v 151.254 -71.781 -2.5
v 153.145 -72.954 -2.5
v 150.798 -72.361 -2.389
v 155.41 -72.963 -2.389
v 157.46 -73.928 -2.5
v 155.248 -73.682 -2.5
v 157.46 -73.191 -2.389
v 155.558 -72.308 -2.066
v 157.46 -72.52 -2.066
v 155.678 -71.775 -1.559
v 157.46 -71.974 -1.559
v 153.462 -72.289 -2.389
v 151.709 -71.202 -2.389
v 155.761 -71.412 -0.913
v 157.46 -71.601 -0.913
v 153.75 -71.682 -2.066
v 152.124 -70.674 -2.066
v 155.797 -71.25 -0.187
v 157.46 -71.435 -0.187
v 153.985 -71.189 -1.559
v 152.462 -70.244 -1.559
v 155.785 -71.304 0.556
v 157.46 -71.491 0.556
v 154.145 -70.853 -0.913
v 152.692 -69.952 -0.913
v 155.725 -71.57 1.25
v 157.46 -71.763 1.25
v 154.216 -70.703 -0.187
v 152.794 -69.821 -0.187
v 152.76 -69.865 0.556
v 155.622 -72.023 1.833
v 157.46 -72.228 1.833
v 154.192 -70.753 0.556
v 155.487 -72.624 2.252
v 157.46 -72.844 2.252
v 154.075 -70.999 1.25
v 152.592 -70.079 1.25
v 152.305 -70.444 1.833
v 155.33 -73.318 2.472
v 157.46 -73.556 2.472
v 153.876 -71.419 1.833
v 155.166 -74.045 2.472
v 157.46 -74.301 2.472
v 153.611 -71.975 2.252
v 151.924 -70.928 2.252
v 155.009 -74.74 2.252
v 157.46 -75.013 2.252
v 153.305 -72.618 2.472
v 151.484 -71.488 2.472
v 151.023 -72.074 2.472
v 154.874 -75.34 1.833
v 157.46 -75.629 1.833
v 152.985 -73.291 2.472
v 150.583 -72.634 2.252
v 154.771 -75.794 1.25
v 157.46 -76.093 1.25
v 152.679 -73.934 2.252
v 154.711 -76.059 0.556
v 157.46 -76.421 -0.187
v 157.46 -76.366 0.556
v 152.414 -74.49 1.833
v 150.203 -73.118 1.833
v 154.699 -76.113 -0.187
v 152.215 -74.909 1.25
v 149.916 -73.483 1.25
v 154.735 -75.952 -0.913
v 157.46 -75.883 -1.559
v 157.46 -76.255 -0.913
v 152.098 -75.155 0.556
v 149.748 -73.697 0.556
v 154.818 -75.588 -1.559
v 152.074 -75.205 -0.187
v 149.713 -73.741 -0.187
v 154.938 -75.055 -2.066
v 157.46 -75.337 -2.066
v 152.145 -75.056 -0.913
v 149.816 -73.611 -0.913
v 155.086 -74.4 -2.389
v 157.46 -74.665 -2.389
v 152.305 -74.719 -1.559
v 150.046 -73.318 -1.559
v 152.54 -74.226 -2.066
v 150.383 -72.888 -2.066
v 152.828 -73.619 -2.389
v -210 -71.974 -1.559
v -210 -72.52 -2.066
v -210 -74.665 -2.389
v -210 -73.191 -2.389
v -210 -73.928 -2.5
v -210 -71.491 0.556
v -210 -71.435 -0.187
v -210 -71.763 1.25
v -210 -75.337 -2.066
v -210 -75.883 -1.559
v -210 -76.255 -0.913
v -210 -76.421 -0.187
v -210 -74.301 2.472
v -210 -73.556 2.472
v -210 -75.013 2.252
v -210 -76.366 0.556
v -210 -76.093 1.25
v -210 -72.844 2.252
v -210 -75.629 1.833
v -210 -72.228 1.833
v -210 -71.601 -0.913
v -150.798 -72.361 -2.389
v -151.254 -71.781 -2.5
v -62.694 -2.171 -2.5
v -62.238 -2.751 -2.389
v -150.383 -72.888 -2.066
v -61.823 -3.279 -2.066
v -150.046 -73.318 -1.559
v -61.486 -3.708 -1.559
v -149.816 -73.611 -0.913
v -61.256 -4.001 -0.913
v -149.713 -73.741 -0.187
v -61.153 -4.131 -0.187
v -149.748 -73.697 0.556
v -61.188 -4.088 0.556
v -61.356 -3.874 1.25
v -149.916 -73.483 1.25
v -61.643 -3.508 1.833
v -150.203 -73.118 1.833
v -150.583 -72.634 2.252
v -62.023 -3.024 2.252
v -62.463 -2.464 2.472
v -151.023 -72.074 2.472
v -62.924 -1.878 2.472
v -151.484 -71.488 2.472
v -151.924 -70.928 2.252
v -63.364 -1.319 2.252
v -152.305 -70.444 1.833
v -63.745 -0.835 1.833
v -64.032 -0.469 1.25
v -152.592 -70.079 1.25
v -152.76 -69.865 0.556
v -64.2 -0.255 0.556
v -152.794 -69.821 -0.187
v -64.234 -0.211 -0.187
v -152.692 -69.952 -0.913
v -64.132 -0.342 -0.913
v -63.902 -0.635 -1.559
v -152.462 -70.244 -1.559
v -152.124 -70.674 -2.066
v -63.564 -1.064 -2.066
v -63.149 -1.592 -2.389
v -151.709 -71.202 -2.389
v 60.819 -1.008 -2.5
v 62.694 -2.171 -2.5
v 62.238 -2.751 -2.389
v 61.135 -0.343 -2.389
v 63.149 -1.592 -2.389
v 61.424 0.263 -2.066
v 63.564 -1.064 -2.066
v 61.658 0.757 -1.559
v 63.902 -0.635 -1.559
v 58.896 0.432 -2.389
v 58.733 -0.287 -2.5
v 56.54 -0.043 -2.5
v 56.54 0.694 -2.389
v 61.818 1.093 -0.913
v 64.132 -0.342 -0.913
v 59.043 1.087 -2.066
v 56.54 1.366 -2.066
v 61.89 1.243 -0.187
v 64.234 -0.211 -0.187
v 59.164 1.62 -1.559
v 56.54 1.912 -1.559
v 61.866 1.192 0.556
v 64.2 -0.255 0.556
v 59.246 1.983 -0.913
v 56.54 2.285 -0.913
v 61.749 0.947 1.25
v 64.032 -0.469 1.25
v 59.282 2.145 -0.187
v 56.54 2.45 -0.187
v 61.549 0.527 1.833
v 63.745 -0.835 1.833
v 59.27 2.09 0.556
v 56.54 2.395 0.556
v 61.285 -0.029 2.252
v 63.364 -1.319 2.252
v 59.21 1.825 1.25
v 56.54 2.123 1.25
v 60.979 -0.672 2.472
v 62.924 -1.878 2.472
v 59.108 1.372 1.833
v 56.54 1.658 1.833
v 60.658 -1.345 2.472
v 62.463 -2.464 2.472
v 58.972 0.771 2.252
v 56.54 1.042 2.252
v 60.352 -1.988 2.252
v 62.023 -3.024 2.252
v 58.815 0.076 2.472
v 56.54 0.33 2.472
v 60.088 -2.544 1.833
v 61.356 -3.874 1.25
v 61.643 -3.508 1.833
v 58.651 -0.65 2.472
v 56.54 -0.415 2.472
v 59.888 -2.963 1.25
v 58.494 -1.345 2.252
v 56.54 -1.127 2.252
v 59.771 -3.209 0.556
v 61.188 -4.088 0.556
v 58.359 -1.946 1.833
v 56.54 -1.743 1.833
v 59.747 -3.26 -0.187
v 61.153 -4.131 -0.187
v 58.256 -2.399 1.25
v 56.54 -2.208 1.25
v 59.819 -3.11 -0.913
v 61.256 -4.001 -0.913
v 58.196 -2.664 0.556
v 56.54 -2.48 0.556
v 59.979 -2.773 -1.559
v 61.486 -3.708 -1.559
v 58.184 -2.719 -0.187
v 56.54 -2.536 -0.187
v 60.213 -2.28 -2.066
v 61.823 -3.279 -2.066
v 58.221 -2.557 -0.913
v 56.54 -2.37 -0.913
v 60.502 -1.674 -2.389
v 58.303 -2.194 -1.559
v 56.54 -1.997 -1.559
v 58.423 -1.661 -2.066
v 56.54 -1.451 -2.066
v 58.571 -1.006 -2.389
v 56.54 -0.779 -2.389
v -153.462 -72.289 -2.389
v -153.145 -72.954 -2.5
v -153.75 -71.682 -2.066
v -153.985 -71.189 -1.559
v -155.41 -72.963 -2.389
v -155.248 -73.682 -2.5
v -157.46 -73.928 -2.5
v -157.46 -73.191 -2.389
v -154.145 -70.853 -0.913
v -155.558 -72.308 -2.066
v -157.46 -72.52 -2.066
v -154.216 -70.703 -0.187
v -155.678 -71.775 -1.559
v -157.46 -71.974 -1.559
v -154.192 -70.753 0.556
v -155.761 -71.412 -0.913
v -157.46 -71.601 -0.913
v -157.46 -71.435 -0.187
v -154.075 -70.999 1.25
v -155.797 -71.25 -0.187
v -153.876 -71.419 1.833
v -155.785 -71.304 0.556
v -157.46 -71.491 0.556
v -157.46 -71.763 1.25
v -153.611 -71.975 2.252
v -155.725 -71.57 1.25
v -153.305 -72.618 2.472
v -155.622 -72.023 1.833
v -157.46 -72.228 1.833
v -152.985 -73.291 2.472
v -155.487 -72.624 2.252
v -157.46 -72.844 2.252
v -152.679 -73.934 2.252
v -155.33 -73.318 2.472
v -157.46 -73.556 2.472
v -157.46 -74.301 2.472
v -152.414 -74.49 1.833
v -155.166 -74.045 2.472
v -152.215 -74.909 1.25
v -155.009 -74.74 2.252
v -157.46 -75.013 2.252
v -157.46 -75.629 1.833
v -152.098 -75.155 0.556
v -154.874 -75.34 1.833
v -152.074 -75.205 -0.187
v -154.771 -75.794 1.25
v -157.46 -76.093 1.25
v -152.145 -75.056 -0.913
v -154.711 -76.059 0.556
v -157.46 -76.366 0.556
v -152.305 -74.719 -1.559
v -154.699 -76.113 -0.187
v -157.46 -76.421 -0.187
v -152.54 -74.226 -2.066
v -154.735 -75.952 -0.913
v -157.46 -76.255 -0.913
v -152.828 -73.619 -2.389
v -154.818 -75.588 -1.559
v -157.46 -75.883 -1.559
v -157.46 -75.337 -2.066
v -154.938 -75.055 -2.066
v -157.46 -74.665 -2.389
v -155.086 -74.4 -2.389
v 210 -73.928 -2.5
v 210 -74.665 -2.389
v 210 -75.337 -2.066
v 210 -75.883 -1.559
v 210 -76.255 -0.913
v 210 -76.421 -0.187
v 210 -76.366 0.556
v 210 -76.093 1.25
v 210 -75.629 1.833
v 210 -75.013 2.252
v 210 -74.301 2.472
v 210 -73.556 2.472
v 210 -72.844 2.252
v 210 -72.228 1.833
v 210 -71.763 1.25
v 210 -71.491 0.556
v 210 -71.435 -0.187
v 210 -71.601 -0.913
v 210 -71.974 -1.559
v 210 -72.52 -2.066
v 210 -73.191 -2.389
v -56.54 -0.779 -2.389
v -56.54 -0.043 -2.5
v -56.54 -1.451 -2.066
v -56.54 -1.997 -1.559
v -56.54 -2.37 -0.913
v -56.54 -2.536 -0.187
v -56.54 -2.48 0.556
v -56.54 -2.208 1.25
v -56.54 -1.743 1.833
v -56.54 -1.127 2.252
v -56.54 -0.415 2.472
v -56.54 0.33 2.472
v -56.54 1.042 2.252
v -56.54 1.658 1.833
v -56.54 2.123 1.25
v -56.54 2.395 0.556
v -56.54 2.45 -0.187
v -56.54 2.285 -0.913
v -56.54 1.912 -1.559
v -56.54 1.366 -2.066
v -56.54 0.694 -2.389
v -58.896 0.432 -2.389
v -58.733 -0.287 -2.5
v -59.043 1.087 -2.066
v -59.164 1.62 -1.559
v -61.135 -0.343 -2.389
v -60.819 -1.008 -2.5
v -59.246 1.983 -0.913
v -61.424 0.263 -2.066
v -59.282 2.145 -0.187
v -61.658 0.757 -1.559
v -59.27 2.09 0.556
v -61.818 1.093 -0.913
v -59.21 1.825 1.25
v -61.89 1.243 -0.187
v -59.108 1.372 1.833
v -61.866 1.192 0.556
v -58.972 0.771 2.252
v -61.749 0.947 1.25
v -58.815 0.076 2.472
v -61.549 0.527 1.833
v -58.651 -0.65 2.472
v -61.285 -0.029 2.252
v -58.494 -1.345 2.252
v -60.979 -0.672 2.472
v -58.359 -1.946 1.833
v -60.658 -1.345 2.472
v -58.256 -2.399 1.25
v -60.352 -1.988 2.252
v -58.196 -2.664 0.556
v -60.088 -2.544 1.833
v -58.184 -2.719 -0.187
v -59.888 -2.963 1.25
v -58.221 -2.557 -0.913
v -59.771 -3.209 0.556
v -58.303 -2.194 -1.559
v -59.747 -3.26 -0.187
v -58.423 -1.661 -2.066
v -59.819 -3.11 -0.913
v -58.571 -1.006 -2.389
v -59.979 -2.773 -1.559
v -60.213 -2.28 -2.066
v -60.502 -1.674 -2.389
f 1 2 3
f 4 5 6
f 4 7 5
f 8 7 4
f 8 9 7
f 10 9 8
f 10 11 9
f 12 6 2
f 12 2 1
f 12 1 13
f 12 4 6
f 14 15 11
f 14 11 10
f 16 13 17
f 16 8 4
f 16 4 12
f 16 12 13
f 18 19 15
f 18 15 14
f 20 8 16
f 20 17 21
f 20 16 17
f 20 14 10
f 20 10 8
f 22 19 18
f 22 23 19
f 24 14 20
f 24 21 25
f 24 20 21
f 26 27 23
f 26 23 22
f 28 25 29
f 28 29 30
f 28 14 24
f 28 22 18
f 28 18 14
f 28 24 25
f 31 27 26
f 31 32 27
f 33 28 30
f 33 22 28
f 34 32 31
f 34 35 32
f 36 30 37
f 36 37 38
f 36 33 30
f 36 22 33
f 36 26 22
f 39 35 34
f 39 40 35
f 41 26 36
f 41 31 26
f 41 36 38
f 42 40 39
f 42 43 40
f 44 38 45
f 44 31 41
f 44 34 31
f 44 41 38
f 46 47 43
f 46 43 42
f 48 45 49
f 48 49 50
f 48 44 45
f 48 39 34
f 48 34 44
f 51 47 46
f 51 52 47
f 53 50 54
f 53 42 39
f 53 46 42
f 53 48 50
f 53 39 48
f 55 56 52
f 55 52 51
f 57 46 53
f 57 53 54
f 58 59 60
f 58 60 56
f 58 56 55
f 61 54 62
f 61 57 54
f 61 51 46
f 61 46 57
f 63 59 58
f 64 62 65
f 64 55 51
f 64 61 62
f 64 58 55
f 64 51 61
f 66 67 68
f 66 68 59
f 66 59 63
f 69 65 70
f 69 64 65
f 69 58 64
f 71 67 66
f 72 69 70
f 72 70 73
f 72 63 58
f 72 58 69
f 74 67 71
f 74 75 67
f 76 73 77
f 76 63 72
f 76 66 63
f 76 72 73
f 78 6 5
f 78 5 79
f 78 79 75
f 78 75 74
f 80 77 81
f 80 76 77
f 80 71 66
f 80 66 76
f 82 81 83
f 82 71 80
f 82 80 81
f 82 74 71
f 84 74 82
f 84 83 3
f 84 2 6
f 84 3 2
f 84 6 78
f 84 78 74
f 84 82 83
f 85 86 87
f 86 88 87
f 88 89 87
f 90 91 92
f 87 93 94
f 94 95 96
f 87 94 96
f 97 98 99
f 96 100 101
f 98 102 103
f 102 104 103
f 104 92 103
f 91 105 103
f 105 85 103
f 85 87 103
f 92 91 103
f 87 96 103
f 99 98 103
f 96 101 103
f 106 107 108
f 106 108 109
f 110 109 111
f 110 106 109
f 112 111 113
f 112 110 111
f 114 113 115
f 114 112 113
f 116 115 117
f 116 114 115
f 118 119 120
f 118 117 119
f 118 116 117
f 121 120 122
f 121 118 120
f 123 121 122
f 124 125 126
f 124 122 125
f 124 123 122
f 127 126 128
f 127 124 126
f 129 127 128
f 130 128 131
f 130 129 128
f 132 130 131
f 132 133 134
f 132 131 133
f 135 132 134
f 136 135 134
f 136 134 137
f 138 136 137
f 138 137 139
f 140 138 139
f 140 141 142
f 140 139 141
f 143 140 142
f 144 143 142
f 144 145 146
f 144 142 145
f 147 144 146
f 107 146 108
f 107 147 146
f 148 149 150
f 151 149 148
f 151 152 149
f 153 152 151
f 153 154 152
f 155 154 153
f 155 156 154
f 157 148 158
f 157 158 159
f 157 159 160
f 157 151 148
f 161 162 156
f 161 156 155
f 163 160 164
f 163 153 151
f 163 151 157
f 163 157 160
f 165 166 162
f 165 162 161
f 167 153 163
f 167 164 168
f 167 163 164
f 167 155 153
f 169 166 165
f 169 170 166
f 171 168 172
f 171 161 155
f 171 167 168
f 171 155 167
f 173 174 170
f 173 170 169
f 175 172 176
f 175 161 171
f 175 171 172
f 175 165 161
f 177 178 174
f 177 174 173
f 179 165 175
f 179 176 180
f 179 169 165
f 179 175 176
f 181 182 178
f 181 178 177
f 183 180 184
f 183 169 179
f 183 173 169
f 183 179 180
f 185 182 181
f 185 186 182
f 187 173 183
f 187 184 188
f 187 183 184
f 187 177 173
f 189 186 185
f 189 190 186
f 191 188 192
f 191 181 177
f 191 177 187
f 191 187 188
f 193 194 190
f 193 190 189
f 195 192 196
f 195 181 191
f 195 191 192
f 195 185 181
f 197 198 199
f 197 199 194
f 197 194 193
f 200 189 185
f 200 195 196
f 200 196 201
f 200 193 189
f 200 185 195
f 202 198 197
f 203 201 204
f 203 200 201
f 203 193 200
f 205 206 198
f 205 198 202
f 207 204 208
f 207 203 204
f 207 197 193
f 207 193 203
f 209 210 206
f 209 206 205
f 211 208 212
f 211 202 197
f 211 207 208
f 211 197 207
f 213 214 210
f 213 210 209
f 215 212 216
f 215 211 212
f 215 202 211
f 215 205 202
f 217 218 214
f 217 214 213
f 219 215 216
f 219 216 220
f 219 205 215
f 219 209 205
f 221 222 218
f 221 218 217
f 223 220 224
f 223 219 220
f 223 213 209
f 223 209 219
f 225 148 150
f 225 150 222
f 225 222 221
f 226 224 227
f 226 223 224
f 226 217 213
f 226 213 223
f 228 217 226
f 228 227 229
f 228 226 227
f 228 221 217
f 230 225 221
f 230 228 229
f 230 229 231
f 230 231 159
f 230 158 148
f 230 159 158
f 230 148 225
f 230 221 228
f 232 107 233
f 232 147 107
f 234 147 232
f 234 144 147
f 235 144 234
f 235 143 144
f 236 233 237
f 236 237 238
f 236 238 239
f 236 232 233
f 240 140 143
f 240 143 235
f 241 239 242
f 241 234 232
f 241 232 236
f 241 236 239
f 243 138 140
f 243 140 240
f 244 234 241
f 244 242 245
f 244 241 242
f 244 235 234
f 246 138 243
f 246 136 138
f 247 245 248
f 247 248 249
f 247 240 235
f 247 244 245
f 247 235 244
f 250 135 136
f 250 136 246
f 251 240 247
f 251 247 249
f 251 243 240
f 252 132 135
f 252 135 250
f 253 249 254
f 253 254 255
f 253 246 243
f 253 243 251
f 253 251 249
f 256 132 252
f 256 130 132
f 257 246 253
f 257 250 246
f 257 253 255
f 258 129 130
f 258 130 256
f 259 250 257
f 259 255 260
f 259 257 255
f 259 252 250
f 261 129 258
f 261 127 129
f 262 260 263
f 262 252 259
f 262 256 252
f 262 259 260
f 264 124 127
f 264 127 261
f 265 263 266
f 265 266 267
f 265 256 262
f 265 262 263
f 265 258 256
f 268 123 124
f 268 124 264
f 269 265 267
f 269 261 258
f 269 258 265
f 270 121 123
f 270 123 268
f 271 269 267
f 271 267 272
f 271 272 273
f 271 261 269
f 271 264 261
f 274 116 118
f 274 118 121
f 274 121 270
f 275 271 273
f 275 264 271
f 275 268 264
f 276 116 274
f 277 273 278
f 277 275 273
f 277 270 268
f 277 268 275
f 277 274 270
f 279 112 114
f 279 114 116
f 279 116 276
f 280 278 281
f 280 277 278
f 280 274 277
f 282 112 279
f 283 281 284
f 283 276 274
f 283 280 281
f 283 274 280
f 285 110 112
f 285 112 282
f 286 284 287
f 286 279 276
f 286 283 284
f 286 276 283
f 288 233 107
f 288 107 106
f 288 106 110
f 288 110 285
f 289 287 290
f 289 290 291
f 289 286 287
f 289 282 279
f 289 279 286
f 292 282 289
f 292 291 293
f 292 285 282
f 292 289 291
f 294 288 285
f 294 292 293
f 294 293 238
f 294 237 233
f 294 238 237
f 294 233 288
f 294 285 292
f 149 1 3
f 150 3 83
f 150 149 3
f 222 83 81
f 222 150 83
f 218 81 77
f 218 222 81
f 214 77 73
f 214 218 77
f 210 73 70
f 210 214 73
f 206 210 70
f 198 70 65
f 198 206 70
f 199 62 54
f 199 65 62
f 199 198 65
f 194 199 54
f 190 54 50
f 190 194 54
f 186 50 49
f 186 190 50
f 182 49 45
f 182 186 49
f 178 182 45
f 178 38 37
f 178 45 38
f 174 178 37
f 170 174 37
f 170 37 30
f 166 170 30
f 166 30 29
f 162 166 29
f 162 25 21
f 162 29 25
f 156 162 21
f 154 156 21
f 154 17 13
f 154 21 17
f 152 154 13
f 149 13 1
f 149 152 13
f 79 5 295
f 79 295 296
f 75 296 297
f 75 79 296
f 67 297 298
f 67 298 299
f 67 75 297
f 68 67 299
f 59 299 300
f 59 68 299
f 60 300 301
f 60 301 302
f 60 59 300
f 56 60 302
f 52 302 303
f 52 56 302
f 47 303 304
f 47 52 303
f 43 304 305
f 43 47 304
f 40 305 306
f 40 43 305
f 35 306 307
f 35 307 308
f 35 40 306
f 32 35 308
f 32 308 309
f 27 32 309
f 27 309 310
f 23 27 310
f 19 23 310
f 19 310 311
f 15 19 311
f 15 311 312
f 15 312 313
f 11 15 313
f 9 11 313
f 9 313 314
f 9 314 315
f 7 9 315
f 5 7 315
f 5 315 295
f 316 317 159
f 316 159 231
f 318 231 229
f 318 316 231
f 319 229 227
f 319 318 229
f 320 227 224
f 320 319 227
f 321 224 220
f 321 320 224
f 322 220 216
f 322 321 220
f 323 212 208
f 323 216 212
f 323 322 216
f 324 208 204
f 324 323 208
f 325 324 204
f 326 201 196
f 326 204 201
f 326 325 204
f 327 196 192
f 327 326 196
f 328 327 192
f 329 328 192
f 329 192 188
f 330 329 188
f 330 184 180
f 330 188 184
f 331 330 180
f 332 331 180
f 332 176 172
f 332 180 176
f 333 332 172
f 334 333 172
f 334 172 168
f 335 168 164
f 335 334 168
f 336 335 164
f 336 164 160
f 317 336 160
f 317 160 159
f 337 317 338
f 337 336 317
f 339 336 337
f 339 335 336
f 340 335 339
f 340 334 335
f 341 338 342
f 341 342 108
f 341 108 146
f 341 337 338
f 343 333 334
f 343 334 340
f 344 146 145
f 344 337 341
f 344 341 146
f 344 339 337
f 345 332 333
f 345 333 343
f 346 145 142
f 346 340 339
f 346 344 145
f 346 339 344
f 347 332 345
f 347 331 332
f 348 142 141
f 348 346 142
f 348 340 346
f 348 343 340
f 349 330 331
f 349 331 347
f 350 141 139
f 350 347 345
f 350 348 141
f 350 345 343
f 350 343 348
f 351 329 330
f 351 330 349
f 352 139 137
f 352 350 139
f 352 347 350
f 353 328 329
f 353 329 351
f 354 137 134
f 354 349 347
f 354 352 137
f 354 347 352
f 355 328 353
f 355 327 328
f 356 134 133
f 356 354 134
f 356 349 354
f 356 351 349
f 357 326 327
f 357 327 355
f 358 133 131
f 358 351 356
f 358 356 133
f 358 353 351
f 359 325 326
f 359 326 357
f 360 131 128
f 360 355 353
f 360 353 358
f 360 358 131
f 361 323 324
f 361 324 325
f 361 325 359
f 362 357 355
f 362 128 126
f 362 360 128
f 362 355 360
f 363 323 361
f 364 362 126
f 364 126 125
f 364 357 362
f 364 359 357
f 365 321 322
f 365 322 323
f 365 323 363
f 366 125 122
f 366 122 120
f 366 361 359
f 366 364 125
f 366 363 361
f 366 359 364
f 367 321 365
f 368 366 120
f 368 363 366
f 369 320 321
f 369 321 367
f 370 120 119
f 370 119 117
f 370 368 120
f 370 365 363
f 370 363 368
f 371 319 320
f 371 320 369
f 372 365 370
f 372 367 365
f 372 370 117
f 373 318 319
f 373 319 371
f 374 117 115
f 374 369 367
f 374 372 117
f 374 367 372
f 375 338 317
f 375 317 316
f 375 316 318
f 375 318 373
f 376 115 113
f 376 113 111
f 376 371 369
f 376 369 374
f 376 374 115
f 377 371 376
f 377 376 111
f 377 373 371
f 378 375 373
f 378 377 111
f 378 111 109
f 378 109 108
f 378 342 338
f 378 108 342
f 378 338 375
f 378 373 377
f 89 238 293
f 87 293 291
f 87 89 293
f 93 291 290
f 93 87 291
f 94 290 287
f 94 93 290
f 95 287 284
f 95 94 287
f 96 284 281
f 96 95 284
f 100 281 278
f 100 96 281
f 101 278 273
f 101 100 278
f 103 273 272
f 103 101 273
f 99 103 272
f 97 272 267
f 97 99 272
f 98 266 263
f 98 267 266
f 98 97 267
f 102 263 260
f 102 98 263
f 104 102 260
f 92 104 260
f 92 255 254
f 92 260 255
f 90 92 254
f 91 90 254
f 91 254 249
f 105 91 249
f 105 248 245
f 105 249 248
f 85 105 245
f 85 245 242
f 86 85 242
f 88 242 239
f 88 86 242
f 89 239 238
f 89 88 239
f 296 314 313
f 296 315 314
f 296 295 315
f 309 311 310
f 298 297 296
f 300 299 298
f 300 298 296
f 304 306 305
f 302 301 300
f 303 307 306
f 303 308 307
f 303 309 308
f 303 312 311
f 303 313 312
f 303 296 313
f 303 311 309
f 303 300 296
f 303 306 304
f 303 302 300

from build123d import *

# Parameters (mm, degrees)
SKETCH2_R = 2.5


with BuildPart() as part:
    # Sweep1: sweep along a path in Sketch1
    with BuildLine(Plane.XY) as sweep1_path:
        Line((210, -73.885714286), (157.459682683, -73.885714286))
        ThreePointArc((157.459682683, -73.885714286), (154.190143217, -73.336117012), (151.279989747, -71.747736622))
        Line((151.279989747, -71.747736622), (62.720010253, -2.137977664))
        ThreePointArc((62.720010253, -2.137977664), (59.809856783, -0.549597274), (56.540317317, 0))
        Line((56.540317317, 0), (-56.540317317, 0))
        ThreePointArc((-56.540317317, 0), (-59.809856783, -0.549597274), (-62.720010253, -2.137977664))
        Line((-62.720010253, -2.137977664), (-151.279989747, -71.747736622))
        ThreePointArc((-151.279989747, -71.747736622), (-154.190143217, -73.336117012), (-157.459682683, -73.885714286))
        Line((-157.459682683, -73.885714286), (-210, -73.885714286))
    # Sketch2 → Sweep1 (sweep)
    with BuildSketch(Plane(origin=(210, -73.885714286, 0), x_dir=(0, 0, -1), z_dir=(1, 0, 0))):
        with Locations((0, -0.042530313)):
            Circle(SKETCH2_R)
    sweep(path=sweep1_path.line)


solid = part.part
